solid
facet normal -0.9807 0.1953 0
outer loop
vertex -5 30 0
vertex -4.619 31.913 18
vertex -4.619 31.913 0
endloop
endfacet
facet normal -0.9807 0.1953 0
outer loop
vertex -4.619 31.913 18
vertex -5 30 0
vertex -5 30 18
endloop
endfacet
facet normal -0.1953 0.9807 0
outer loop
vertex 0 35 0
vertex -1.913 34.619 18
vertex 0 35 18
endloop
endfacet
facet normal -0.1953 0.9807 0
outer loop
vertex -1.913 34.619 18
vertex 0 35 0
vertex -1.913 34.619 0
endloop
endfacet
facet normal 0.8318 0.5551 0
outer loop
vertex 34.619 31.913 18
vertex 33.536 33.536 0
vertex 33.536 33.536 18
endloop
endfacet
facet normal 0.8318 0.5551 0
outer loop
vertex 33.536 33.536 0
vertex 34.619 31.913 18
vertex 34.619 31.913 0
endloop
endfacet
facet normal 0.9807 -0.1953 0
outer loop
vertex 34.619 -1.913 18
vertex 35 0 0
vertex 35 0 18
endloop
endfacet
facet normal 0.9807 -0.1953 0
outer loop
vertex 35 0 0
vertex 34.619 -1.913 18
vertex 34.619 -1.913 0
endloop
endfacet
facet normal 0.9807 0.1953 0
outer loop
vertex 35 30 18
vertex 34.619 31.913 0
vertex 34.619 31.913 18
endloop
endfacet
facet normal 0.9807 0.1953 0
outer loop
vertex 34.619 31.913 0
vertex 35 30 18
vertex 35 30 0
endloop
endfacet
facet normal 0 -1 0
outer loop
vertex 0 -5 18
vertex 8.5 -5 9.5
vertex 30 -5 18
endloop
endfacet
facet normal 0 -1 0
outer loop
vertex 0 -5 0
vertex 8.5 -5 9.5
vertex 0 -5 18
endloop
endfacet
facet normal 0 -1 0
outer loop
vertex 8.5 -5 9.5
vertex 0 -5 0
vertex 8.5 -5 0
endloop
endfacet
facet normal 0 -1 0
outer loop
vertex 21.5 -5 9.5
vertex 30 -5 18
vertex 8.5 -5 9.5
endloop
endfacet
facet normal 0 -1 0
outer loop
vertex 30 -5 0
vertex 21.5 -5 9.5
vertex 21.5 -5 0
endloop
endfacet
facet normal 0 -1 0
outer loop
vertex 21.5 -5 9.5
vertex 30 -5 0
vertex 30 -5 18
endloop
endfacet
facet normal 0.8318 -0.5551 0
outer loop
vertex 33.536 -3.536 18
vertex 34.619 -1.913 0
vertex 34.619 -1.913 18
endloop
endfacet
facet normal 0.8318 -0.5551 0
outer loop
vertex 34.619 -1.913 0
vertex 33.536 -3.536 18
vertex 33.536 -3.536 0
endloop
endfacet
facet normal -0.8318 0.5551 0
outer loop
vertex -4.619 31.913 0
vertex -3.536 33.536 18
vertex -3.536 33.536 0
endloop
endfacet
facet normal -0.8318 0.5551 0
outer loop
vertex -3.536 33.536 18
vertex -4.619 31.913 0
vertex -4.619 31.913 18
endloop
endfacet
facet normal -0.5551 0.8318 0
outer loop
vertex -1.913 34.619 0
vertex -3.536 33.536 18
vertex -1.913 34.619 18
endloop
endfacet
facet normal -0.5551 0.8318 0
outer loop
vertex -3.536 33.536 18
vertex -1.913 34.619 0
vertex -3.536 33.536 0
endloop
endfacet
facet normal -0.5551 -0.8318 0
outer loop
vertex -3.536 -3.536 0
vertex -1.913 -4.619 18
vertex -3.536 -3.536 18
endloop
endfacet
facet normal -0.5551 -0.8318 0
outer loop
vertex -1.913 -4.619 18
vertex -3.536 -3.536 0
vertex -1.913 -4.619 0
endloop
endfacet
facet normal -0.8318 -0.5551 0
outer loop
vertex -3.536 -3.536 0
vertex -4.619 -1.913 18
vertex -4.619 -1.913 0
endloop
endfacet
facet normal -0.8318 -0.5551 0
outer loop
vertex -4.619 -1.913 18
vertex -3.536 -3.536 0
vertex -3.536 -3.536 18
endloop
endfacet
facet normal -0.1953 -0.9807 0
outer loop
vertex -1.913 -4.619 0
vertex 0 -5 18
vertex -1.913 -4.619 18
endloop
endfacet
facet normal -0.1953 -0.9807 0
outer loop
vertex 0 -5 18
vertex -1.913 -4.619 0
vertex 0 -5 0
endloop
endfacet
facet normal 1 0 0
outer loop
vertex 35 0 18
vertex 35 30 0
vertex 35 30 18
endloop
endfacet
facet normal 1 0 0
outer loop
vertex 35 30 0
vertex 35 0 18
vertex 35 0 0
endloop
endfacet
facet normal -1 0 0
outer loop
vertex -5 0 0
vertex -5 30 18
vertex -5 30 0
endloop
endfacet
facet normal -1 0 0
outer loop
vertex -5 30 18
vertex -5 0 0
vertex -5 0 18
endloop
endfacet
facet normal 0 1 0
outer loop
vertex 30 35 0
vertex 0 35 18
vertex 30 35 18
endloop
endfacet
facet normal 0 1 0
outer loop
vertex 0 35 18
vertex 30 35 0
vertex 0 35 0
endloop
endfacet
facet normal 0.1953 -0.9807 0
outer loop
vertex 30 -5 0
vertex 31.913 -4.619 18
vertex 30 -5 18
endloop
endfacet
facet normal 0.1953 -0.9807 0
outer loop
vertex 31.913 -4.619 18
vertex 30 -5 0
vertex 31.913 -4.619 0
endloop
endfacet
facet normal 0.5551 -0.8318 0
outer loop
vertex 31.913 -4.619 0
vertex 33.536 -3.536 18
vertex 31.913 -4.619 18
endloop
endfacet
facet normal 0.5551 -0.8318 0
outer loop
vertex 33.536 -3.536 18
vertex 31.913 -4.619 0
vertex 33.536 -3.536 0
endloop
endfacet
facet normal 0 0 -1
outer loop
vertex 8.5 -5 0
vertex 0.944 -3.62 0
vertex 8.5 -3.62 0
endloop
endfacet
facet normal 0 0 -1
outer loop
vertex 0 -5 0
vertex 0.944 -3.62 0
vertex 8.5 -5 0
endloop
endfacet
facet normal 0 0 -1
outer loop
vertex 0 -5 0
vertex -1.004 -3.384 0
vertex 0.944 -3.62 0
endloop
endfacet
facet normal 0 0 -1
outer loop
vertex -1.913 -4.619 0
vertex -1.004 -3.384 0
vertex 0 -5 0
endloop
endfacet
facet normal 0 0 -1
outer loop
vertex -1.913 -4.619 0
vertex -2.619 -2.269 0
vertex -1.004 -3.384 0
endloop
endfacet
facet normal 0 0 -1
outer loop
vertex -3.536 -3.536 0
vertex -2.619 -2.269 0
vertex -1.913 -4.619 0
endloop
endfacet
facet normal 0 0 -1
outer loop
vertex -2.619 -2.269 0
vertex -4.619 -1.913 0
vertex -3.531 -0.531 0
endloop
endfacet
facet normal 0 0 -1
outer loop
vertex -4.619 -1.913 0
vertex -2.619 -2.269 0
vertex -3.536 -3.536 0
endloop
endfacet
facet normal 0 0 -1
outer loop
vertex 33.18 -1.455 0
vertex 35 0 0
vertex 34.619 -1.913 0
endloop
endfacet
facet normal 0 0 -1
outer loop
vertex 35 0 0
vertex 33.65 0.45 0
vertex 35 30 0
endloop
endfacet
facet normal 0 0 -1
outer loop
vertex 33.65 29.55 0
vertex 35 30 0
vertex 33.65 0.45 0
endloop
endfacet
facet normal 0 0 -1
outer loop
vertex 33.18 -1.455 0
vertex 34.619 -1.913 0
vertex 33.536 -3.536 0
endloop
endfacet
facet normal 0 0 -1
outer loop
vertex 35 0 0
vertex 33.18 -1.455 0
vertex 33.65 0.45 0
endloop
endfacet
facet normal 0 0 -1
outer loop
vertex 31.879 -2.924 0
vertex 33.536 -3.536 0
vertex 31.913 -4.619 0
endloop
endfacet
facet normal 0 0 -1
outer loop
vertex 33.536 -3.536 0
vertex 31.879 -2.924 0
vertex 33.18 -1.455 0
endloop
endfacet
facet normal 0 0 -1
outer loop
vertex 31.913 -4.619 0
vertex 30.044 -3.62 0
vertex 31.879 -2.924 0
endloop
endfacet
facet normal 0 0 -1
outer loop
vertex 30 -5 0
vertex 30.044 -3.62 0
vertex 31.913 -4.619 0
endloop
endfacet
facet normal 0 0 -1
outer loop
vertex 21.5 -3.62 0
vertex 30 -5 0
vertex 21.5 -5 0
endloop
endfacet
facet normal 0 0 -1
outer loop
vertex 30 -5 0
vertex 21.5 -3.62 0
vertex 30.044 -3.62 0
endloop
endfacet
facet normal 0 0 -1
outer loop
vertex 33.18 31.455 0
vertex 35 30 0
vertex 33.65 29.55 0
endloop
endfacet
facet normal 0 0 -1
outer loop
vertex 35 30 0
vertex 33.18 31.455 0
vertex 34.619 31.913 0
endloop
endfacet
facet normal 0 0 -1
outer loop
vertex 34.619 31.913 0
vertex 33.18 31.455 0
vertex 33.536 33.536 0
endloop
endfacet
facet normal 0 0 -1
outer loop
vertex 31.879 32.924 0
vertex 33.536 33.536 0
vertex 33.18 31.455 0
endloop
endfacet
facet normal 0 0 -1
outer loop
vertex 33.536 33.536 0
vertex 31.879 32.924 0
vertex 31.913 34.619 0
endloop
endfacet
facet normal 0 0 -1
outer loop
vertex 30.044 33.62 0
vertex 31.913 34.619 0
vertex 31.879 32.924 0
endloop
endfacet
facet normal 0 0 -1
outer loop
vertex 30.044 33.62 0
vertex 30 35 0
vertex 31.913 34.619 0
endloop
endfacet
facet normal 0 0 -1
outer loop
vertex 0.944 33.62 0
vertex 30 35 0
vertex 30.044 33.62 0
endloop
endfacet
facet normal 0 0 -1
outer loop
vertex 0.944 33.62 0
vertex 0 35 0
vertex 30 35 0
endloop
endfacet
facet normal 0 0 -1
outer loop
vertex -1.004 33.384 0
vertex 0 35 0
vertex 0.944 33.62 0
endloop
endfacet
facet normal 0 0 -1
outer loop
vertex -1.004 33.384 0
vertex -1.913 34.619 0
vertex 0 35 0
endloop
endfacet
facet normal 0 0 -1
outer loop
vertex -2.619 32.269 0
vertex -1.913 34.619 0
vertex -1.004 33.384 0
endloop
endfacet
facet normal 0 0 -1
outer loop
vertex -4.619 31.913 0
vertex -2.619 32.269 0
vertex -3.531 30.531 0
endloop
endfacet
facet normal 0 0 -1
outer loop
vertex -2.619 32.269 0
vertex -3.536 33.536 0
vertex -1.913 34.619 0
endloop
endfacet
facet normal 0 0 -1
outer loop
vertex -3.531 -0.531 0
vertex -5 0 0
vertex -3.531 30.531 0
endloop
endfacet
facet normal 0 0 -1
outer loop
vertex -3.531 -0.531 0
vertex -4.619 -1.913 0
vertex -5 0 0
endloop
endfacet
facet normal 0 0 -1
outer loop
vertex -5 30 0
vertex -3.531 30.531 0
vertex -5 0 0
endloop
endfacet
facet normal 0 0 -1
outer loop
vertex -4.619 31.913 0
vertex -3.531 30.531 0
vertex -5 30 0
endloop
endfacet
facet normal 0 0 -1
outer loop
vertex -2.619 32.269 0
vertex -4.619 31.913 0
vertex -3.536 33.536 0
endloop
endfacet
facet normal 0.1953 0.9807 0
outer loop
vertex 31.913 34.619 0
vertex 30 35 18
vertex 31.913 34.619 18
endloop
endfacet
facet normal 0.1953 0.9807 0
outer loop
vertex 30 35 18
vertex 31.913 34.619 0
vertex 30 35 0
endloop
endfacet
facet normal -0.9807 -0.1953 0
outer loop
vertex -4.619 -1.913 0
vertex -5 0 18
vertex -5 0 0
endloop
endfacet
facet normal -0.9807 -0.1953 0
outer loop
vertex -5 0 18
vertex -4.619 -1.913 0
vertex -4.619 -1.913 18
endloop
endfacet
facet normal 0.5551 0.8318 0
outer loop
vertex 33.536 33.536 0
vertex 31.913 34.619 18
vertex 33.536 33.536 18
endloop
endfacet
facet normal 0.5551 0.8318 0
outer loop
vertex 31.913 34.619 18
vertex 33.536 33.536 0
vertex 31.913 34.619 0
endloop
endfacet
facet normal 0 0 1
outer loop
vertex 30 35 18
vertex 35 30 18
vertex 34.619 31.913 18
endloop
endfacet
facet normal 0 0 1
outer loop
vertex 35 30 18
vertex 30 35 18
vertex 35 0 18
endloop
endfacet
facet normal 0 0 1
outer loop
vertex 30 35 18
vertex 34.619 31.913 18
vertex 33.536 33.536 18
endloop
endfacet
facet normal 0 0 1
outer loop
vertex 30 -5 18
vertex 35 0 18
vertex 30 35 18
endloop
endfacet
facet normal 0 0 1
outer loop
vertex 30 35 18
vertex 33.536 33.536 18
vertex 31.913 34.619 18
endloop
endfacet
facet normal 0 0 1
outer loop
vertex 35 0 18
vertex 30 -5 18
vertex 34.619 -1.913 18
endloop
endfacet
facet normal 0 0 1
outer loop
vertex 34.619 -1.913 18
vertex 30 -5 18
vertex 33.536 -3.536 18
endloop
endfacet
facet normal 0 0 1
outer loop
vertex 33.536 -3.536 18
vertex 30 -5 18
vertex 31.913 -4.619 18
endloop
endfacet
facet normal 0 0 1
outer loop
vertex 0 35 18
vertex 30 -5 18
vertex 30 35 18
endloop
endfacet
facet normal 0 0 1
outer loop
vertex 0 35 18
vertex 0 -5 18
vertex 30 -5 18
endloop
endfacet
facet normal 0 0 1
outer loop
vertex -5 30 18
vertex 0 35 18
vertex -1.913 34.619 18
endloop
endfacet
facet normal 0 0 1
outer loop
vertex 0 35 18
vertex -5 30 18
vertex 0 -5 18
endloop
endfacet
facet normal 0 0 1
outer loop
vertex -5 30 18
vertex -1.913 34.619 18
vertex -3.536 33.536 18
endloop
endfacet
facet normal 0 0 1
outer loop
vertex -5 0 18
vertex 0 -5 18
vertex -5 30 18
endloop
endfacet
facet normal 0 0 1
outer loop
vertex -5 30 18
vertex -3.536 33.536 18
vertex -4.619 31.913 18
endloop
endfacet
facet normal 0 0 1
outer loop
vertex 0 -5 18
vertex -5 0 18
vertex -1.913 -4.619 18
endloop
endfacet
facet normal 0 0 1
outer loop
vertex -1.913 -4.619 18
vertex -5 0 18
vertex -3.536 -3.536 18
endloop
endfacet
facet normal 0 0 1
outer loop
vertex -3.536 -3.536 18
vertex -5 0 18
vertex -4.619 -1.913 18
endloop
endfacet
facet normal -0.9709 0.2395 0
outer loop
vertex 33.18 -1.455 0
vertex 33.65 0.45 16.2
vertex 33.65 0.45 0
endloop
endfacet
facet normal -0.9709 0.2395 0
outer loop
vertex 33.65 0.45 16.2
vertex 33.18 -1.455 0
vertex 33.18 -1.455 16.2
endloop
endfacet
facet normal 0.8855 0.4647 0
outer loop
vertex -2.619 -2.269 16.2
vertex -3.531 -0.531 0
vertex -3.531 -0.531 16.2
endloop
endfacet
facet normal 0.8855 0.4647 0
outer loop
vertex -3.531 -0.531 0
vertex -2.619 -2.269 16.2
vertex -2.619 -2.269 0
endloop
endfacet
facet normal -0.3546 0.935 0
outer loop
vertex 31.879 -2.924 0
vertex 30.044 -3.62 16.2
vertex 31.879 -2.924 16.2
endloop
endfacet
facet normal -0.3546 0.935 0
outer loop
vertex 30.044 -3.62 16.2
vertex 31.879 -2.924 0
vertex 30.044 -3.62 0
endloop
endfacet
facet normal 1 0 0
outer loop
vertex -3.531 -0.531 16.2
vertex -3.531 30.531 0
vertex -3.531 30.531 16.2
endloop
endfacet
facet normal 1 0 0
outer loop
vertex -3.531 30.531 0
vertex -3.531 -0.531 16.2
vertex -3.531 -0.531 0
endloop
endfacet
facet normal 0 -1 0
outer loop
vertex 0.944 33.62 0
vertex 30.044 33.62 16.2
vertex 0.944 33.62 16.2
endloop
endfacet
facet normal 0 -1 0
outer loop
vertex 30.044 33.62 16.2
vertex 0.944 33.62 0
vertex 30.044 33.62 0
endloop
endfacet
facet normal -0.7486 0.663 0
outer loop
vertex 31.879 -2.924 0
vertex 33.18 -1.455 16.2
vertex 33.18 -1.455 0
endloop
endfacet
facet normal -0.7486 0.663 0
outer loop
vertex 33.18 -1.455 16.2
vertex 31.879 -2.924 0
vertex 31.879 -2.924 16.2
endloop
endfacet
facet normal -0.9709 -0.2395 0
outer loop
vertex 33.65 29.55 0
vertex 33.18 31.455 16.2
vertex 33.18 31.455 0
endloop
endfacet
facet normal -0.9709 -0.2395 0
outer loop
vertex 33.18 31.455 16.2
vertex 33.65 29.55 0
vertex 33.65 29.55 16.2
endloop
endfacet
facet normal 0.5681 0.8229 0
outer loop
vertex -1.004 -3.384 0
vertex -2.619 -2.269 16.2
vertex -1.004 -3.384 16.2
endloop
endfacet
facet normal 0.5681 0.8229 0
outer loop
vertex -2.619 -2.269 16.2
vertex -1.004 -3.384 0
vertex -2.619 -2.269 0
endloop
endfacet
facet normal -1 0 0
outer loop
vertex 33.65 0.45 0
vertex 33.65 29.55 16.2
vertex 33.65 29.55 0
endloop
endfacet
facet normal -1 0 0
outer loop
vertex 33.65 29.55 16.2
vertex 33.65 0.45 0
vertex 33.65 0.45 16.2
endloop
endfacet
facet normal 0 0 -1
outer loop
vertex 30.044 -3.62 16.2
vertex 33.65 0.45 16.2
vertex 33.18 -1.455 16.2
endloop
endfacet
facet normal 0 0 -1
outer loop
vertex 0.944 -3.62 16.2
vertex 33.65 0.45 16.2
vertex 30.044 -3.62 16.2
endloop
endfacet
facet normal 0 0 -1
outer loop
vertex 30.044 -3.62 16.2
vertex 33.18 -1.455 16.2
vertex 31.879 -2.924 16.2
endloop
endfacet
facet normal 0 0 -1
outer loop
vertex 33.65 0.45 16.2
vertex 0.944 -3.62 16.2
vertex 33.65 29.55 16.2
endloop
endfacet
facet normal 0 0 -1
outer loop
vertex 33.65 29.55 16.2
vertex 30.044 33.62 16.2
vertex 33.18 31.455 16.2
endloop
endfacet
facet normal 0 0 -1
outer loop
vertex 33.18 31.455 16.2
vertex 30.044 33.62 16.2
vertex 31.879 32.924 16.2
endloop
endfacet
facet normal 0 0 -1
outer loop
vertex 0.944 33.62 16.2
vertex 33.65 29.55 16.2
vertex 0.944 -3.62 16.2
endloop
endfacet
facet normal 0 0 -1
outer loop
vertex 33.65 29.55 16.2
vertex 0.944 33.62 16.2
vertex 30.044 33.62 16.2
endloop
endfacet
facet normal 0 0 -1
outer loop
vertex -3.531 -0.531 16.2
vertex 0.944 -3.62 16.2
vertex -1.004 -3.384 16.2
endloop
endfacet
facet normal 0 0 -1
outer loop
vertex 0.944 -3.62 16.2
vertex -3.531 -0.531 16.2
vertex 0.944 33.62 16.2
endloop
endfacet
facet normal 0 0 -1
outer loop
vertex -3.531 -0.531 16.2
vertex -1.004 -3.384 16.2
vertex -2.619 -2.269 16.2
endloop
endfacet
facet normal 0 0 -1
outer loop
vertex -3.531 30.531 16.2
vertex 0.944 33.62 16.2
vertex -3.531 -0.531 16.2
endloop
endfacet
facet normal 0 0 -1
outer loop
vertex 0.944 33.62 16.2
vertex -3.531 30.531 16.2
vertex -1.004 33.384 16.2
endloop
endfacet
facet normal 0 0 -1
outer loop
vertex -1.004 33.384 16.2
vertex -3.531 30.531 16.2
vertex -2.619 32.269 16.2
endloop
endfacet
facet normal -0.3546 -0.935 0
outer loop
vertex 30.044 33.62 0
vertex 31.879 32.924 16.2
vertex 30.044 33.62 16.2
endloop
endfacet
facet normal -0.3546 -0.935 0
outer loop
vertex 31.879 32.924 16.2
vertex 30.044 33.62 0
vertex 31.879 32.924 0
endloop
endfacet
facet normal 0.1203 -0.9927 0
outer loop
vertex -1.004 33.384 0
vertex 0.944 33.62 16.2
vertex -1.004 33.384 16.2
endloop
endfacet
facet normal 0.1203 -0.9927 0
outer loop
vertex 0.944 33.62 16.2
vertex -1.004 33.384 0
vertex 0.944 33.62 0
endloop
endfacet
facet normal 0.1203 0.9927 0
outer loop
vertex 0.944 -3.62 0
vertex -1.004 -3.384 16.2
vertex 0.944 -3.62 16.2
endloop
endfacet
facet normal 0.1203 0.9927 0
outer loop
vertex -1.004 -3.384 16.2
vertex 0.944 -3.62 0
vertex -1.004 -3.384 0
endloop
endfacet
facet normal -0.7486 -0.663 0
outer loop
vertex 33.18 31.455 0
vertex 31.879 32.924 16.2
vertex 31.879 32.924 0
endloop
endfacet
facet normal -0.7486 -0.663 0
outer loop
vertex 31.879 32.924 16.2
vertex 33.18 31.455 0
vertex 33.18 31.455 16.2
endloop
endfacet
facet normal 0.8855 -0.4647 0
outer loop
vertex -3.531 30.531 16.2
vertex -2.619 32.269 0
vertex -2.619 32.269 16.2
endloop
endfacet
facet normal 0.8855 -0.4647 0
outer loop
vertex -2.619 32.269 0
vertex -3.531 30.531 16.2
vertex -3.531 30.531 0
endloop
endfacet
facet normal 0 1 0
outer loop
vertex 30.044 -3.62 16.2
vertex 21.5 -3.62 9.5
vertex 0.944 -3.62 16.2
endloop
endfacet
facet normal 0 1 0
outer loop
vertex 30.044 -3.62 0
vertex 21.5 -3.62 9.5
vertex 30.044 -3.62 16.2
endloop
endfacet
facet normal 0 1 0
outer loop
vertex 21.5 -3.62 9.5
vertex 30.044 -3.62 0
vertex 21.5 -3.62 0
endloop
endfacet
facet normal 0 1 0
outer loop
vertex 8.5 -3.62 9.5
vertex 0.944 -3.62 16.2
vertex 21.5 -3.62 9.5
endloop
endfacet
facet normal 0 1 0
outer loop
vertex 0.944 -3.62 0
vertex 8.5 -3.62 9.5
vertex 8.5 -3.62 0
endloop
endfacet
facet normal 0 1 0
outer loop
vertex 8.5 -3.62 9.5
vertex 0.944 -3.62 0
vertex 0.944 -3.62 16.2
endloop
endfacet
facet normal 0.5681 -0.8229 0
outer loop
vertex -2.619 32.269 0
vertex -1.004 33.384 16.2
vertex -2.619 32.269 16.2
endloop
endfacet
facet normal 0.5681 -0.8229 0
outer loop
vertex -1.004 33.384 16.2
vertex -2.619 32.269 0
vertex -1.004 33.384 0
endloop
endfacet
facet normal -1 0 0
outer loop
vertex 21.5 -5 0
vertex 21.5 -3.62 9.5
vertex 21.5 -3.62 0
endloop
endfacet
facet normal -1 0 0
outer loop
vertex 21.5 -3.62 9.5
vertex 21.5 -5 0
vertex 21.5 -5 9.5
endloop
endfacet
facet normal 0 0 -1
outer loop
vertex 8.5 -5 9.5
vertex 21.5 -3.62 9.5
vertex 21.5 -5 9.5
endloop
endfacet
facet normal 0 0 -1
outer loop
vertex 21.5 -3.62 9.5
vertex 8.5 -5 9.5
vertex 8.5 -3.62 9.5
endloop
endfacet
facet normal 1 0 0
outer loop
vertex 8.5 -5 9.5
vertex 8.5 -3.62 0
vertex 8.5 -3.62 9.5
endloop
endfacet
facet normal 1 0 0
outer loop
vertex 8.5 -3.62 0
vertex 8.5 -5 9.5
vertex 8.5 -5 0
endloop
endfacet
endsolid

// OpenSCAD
/**
 * This work is licensed under a <a rel="license" href="https://creativecommons.org/licenses/by-sa/4.0/">Creative Commons Attribution 4.0 Unported License</a>.
 * You can find this on thingiverse: http://www.thingiverse.com/thing:1995025
 */

difference() {
    linear_extrude(18)
    minkowski() {
        circle(r=5);
        square([30, 30]);
    };
    translate([0.45, 0.45, -1.8]) {
        linear_extrude(18)
        minkowski() {
            circle(r=4.1);
            square([29.1, 29.1]);
        };
    }
    translate([15,0, 3.5]) {   
        cube([13, 50, 12], center=true);
    }
}
